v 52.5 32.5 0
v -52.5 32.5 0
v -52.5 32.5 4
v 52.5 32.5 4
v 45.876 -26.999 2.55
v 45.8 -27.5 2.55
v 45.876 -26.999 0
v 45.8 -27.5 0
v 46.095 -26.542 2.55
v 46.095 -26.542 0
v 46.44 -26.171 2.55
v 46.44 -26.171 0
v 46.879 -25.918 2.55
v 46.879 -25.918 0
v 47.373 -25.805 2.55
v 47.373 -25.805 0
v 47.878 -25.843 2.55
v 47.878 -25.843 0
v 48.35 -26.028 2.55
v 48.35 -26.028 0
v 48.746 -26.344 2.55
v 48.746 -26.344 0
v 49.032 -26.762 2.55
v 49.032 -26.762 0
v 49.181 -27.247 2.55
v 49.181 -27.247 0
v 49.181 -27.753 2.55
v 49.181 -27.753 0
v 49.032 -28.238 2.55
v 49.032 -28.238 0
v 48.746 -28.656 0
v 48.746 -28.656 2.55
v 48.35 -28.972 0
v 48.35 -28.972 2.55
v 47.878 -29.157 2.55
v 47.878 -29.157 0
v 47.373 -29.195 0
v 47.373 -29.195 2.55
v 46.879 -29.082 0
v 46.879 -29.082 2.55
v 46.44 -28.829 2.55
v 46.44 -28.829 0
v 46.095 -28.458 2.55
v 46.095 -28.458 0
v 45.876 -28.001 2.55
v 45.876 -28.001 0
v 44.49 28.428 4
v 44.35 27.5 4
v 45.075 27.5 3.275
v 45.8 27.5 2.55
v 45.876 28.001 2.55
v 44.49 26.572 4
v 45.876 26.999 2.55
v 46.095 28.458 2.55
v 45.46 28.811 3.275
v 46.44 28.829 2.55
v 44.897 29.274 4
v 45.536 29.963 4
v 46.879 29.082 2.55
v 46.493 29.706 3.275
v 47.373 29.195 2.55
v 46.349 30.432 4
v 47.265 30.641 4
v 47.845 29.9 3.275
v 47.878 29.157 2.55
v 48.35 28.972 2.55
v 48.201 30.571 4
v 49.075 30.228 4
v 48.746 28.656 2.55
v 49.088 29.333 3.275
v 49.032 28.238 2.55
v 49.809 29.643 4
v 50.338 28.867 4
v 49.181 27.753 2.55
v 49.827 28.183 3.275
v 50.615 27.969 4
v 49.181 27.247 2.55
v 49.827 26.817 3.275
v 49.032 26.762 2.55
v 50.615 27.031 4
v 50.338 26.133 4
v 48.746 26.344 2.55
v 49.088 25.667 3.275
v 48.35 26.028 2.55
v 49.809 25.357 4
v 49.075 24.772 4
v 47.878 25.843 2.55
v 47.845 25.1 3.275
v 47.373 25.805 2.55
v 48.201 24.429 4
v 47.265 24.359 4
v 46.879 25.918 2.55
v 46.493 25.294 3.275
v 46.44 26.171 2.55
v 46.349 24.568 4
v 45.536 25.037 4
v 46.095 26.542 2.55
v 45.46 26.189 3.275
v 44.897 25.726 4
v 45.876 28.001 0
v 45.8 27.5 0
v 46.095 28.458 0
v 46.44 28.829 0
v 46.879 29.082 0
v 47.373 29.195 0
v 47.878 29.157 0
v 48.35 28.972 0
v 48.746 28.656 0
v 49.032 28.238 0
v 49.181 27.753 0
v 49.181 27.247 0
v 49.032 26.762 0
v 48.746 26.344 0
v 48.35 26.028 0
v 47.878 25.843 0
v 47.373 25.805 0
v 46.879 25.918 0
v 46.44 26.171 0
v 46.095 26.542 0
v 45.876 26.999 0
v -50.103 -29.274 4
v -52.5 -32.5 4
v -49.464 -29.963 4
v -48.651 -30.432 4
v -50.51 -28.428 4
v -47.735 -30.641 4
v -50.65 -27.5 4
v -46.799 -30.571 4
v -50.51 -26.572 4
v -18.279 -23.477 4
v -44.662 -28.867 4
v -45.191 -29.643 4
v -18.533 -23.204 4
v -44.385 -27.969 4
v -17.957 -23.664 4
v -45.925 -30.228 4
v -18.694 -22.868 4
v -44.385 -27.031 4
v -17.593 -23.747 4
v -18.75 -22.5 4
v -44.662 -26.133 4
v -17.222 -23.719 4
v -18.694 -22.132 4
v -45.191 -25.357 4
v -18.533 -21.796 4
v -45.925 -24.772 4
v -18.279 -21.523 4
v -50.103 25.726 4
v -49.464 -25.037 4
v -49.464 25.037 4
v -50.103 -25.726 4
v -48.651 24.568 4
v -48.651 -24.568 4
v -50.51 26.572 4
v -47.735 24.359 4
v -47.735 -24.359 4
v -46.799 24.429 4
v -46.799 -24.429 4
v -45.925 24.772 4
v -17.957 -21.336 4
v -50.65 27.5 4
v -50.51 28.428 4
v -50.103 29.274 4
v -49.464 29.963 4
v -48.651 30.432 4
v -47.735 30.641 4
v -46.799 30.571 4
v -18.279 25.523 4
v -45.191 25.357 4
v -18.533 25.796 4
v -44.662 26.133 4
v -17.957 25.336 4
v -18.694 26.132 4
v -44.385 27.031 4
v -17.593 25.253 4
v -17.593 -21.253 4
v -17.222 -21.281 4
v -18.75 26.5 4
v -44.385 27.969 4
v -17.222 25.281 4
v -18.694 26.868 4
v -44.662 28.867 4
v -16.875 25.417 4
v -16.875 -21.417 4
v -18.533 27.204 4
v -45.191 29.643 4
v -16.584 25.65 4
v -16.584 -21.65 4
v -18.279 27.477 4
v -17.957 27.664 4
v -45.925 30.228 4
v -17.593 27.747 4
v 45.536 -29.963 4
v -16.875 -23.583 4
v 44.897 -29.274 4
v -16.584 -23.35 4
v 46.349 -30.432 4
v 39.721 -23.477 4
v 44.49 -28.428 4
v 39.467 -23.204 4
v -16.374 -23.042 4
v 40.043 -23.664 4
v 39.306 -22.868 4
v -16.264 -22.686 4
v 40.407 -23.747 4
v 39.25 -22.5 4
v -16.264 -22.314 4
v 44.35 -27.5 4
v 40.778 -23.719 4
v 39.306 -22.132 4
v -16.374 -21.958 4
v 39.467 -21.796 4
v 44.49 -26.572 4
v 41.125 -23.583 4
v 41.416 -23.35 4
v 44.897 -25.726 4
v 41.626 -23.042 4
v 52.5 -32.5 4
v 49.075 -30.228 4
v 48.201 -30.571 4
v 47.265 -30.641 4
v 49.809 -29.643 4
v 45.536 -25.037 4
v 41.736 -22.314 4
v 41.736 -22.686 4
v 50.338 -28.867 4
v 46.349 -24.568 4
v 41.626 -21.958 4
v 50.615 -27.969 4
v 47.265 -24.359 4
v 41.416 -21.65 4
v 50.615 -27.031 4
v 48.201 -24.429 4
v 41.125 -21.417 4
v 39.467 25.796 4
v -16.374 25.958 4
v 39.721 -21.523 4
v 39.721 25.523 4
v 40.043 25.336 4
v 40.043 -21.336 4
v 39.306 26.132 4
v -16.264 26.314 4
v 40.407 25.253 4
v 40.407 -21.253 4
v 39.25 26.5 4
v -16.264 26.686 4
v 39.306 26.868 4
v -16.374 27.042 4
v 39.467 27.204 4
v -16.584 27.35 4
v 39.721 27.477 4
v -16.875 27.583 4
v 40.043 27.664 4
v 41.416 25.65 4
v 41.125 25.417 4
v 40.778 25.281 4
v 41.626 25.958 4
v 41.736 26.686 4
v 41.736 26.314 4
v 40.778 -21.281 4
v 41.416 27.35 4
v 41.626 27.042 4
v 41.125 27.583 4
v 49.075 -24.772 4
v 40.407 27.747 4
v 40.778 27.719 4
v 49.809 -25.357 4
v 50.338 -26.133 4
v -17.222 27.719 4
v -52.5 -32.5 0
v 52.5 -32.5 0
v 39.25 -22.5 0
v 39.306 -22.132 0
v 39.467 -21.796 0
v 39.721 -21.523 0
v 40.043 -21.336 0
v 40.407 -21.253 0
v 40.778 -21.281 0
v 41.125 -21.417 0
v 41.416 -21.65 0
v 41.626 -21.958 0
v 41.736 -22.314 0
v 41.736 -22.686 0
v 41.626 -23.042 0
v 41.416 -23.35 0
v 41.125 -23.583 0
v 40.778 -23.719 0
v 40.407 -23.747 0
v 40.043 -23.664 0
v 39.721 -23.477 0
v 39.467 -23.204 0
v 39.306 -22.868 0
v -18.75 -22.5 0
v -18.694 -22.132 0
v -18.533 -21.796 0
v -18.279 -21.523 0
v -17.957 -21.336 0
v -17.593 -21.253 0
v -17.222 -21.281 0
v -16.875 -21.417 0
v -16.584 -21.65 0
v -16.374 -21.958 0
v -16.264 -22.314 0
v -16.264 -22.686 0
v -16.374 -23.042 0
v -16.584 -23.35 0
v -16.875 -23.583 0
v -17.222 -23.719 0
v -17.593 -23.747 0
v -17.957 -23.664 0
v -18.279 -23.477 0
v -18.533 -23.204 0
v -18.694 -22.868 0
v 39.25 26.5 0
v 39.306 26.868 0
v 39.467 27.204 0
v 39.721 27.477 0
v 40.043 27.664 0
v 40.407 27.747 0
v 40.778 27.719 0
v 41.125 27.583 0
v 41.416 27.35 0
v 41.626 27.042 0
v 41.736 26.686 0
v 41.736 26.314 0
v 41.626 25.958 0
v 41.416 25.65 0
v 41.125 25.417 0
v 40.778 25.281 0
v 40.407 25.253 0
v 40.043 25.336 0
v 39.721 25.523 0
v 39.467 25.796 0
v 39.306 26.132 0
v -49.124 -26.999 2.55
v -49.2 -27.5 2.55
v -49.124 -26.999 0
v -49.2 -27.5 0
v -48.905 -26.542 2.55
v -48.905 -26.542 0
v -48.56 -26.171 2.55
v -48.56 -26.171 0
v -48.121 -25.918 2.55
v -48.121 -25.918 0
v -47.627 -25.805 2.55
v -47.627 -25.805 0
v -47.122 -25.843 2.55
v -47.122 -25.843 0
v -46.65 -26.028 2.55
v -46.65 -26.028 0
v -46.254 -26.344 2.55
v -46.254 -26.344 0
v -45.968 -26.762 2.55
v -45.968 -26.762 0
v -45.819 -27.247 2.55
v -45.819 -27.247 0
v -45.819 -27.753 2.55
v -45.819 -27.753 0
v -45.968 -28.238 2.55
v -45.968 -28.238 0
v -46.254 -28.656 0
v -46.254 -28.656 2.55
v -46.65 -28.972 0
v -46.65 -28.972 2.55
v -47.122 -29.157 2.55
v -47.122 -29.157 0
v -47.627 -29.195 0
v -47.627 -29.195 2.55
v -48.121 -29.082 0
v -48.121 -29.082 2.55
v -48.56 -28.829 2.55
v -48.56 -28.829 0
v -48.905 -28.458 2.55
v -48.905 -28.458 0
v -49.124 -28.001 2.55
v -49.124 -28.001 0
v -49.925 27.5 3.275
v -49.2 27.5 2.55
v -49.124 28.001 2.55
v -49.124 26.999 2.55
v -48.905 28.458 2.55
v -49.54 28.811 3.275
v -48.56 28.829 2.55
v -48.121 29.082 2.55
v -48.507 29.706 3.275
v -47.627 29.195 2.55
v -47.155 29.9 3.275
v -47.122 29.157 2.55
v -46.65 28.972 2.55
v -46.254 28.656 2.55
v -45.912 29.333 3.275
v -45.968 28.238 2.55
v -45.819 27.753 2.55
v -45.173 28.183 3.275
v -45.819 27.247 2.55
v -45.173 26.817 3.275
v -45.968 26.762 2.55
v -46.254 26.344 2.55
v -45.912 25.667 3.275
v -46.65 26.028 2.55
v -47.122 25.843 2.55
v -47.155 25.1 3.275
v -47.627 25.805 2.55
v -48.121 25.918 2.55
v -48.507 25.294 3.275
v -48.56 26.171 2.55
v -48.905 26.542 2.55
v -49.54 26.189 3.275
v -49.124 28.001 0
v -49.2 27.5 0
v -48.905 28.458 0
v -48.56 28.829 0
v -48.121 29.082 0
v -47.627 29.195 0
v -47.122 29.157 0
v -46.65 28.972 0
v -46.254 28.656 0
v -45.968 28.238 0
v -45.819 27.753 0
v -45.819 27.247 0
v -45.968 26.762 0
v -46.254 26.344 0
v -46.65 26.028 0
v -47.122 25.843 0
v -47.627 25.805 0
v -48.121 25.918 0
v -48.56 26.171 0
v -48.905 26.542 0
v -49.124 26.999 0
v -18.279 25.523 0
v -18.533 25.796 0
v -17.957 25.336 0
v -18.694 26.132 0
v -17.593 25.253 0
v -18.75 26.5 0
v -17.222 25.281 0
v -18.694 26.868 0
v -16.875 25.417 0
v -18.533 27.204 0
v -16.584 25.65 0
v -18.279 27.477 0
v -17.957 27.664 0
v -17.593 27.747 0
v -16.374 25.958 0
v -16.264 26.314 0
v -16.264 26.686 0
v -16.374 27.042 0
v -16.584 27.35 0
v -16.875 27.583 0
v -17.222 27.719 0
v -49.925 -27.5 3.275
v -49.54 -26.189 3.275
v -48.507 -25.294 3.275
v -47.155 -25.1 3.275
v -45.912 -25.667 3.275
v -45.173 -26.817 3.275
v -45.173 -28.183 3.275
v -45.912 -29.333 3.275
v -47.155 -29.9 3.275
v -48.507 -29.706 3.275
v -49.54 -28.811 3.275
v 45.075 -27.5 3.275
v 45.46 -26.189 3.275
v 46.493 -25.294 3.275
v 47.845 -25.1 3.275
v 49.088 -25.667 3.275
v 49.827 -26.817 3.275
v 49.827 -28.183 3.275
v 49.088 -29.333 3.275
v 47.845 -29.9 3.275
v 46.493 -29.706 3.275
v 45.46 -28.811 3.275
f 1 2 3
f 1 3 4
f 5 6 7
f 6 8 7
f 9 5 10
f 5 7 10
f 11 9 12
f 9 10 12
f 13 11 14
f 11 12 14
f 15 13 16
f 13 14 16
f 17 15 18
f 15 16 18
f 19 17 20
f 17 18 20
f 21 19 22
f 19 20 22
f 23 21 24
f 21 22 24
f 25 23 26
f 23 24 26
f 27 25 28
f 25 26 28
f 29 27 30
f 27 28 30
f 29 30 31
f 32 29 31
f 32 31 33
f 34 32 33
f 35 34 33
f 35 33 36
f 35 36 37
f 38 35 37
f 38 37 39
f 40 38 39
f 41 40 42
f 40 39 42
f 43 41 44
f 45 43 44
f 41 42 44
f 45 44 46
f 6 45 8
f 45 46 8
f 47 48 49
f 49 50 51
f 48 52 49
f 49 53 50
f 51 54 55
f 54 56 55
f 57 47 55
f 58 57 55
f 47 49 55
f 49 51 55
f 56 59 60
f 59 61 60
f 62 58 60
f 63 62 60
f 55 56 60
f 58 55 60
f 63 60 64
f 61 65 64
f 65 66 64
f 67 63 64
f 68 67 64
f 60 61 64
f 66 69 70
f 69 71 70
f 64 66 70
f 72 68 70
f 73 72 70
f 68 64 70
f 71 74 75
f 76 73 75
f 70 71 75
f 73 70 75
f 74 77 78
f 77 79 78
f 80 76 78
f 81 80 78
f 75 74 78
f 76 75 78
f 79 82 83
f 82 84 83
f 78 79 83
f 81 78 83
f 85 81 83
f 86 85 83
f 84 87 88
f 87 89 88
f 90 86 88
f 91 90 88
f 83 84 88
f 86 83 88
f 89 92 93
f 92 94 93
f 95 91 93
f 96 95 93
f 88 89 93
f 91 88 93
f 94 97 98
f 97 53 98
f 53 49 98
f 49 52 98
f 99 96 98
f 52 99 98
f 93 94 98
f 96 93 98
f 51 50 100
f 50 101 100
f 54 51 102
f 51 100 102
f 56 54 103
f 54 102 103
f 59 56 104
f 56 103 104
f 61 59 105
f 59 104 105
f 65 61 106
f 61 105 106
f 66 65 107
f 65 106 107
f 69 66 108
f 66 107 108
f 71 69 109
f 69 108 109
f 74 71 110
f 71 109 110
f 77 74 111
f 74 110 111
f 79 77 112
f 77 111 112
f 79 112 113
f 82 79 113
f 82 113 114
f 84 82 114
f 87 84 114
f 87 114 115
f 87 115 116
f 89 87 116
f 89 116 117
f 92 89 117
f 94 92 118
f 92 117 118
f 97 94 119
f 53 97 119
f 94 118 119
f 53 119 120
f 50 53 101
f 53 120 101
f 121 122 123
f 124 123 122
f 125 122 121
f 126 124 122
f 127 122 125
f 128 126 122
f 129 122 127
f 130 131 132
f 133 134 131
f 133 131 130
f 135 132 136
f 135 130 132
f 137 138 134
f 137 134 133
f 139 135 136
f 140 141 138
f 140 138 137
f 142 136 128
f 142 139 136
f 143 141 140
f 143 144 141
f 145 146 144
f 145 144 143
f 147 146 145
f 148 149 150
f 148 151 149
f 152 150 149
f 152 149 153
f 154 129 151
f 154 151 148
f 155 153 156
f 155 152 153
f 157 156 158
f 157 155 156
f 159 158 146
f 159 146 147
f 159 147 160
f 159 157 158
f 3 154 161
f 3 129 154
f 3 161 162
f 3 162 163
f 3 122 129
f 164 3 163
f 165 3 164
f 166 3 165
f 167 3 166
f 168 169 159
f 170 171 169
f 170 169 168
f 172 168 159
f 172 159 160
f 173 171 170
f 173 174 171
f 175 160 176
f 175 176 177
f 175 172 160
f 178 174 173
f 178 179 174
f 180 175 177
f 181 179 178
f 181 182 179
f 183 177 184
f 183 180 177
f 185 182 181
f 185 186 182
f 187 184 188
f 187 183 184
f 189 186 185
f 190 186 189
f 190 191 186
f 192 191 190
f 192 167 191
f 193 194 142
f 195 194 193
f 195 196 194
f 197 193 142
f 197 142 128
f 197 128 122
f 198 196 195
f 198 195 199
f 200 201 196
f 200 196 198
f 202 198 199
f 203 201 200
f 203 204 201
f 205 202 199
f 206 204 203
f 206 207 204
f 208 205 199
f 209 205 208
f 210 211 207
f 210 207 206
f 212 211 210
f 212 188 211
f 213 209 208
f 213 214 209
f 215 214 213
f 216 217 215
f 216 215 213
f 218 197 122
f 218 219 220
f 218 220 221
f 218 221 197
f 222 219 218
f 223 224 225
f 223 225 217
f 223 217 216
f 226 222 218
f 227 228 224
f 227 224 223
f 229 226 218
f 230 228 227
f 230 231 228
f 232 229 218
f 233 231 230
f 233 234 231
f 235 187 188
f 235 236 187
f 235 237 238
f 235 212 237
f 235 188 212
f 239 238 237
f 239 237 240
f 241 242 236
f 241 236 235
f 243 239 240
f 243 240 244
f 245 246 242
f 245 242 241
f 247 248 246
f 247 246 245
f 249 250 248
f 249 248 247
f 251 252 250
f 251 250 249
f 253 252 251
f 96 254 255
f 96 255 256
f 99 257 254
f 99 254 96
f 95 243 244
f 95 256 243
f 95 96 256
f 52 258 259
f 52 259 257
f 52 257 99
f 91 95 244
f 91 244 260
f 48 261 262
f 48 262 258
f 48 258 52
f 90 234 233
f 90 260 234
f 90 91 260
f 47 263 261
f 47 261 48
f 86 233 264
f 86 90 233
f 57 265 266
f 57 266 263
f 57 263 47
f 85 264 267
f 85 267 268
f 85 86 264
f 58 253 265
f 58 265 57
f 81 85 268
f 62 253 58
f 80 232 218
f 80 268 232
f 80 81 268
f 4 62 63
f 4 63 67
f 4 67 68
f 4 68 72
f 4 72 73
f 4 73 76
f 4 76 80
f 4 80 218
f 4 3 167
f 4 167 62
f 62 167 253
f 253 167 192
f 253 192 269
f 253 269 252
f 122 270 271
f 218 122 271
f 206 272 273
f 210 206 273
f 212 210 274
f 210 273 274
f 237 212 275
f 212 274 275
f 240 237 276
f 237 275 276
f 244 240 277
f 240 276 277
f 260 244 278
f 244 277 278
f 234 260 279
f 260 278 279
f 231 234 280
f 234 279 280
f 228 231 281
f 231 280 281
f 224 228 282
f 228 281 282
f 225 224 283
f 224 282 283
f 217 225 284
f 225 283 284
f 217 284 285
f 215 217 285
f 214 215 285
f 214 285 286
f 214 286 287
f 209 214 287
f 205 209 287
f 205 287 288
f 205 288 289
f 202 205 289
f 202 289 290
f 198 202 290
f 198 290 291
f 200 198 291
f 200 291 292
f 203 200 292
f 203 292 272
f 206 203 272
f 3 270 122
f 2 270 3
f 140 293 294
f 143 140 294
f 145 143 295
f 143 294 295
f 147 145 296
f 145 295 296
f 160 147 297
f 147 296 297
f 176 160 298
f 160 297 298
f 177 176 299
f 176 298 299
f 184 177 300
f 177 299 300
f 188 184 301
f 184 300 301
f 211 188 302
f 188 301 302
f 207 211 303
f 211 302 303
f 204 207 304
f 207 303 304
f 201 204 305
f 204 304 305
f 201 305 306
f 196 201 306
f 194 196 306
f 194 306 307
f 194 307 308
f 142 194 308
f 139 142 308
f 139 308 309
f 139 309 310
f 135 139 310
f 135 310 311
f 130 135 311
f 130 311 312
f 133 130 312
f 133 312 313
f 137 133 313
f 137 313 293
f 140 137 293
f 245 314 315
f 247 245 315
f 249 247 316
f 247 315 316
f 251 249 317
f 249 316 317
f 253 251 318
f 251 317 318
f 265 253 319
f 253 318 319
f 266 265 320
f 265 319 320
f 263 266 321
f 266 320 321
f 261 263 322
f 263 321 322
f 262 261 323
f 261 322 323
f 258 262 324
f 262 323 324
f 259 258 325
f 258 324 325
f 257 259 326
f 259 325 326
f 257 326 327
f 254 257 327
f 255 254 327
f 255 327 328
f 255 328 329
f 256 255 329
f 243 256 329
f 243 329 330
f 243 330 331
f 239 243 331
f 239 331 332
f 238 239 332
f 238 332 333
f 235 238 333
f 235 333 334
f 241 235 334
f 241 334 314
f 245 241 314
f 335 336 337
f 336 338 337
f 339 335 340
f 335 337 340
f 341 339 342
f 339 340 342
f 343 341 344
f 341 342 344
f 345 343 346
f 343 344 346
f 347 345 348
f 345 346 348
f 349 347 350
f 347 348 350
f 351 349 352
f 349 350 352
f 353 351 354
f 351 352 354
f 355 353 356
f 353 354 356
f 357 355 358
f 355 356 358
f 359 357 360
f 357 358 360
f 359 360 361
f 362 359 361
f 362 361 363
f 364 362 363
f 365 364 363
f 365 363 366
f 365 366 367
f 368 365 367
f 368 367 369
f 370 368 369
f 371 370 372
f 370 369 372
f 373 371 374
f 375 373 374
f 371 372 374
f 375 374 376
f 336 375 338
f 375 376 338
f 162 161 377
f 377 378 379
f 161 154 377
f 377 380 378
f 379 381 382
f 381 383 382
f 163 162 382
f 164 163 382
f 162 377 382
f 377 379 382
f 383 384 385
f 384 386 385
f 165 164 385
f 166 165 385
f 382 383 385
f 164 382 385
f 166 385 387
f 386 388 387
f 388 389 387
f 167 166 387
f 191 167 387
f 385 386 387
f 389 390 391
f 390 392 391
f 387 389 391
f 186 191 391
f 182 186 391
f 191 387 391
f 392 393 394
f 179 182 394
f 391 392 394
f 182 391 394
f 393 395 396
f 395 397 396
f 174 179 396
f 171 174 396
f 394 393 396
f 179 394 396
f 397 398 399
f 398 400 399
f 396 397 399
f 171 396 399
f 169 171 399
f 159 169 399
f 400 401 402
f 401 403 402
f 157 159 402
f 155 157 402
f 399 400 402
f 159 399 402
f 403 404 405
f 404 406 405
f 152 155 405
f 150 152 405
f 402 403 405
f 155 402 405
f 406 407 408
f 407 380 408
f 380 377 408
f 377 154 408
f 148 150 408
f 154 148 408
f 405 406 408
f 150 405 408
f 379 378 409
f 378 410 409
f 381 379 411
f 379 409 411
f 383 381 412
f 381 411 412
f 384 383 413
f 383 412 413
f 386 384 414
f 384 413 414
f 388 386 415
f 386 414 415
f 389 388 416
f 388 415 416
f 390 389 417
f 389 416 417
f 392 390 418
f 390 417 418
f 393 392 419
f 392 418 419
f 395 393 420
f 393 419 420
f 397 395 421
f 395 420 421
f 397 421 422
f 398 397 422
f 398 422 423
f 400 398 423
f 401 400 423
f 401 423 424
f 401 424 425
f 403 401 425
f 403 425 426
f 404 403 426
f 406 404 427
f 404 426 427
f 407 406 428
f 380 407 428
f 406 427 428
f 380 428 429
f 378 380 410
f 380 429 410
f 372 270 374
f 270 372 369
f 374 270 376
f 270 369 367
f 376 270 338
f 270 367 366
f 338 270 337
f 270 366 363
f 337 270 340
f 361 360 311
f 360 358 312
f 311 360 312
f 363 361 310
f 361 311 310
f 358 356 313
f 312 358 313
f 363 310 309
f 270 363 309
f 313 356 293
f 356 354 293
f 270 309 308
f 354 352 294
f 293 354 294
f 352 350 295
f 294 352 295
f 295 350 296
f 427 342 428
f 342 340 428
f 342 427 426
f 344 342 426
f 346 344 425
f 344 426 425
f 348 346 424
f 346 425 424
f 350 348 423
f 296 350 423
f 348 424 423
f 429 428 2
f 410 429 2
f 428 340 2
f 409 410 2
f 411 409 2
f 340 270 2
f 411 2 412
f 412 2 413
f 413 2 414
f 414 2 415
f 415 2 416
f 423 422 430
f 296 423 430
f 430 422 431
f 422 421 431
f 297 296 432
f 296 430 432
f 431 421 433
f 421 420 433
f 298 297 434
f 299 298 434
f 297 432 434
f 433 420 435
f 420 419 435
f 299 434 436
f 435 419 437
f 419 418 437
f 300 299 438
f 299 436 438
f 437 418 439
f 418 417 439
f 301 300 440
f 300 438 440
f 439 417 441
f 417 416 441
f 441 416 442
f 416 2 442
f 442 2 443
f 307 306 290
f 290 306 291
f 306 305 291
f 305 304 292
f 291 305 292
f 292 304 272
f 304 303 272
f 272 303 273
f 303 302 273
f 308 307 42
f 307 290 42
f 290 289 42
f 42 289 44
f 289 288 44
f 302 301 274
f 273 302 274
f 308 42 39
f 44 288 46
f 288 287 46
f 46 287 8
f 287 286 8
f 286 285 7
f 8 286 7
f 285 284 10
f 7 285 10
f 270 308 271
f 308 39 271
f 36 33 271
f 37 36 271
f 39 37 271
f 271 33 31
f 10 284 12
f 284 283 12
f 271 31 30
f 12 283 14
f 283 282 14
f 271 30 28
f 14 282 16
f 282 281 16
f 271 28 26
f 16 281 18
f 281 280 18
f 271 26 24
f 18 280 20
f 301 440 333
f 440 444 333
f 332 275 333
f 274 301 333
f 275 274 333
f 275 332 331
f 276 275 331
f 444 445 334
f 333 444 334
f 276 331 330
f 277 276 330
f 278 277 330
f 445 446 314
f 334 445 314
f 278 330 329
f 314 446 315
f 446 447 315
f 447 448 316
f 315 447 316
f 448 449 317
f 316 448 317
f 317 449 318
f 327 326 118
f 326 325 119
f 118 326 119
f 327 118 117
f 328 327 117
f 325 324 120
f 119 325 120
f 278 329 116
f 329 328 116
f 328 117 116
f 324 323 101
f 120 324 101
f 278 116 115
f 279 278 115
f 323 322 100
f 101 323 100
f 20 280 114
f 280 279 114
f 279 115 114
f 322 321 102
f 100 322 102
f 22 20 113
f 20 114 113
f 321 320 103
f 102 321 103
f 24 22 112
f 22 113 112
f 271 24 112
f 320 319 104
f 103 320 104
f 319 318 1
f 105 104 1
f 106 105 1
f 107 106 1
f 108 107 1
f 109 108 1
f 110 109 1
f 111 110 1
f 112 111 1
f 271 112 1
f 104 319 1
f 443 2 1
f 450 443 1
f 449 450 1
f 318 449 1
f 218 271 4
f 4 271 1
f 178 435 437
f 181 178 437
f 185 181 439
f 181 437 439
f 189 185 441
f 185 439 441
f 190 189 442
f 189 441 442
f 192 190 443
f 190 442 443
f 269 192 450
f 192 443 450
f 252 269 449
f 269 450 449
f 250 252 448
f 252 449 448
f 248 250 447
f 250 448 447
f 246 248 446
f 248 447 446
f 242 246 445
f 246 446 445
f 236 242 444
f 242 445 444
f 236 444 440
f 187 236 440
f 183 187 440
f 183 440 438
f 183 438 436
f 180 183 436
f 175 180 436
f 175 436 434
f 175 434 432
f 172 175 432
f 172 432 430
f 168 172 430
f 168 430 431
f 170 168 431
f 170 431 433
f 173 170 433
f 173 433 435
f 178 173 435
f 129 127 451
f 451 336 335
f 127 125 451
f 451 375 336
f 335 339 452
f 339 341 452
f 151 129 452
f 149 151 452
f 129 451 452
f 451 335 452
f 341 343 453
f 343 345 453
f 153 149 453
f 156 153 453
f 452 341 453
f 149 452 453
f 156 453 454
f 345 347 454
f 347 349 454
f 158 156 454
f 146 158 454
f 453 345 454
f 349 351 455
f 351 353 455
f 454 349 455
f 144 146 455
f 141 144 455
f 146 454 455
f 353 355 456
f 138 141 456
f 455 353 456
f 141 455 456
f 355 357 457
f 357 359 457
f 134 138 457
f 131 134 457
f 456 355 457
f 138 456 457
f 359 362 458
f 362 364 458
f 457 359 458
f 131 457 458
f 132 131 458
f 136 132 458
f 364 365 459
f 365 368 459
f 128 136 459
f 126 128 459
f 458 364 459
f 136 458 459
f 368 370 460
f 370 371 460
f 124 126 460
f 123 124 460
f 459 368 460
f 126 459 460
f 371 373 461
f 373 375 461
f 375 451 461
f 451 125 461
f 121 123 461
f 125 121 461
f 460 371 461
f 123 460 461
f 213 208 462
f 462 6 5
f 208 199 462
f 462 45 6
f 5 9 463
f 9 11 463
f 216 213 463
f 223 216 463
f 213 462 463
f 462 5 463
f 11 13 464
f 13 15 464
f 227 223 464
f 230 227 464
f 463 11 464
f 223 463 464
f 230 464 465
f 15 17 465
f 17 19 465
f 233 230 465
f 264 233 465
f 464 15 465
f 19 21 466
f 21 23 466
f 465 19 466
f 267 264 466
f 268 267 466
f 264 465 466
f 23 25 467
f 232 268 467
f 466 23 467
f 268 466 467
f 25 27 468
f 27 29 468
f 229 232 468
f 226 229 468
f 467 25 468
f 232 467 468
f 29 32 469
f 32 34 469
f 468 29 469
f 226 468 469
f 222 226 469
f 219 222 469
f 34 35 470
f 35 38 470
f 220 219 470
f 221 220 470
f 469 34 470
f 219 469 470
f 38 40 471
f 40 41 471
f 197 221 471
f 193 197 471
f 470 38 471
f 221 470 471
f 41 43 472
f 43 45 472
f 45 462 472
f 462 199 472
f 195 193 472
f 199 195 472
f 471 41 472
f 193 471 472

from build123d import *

# Parameters (mm, degrees)
SKETCH_1_W                     = 105
SKETCH_1_H                     = 65
EXTRUDE_1_DEPTH                = 4
HOLE_WIZARD_M3_1_D             = 2.5
HOLE_WIZARD_M3_1_2_D           = 3.4
HOLE_WIZARD_M3_1_2_CSINK_D     = 6.3
HOLE_WIZARD_M3_1_2_CSINK_ANGLE = 90


with BuildPart() as part:
    # 草圖1 → 填料-伸長1 (new body)
    with BuildSketch(Plane.XY):
        Rectangle(SKETCH_1_W, SKETCH_1_H)
    extrude(amount=EXTRUDE_1_DEPTH)

    # Hole Wizard M3 _1 (through all)
    with Locations(Plane.XY.offset(4)):
        with Locations((40.5, 26.5), (40.5, -22.5), (-17.5, -22.5), (-17.5, 26.5)):
            Hole(HOLE_WIZARD_M3_1_D / 2)

    # Hole Wizard M3 _1 2 (through all)
    with Locations(Plane.XY.offset(4)):
        with Locations((-47.5, 27.5), (-47.5, -27.5), (47.5, 27.5), (47.5, -27.5)):
            CounterSinkHole(HOLE_WIZARD_M3_1_2_D / 2, HOLE_WIZARD_M3_1_2_CSINK_D / 2, counter_sink_angle=HOLE_WIZARD_M3_1_2_CSINK_ANGLE)


solid = part.part
